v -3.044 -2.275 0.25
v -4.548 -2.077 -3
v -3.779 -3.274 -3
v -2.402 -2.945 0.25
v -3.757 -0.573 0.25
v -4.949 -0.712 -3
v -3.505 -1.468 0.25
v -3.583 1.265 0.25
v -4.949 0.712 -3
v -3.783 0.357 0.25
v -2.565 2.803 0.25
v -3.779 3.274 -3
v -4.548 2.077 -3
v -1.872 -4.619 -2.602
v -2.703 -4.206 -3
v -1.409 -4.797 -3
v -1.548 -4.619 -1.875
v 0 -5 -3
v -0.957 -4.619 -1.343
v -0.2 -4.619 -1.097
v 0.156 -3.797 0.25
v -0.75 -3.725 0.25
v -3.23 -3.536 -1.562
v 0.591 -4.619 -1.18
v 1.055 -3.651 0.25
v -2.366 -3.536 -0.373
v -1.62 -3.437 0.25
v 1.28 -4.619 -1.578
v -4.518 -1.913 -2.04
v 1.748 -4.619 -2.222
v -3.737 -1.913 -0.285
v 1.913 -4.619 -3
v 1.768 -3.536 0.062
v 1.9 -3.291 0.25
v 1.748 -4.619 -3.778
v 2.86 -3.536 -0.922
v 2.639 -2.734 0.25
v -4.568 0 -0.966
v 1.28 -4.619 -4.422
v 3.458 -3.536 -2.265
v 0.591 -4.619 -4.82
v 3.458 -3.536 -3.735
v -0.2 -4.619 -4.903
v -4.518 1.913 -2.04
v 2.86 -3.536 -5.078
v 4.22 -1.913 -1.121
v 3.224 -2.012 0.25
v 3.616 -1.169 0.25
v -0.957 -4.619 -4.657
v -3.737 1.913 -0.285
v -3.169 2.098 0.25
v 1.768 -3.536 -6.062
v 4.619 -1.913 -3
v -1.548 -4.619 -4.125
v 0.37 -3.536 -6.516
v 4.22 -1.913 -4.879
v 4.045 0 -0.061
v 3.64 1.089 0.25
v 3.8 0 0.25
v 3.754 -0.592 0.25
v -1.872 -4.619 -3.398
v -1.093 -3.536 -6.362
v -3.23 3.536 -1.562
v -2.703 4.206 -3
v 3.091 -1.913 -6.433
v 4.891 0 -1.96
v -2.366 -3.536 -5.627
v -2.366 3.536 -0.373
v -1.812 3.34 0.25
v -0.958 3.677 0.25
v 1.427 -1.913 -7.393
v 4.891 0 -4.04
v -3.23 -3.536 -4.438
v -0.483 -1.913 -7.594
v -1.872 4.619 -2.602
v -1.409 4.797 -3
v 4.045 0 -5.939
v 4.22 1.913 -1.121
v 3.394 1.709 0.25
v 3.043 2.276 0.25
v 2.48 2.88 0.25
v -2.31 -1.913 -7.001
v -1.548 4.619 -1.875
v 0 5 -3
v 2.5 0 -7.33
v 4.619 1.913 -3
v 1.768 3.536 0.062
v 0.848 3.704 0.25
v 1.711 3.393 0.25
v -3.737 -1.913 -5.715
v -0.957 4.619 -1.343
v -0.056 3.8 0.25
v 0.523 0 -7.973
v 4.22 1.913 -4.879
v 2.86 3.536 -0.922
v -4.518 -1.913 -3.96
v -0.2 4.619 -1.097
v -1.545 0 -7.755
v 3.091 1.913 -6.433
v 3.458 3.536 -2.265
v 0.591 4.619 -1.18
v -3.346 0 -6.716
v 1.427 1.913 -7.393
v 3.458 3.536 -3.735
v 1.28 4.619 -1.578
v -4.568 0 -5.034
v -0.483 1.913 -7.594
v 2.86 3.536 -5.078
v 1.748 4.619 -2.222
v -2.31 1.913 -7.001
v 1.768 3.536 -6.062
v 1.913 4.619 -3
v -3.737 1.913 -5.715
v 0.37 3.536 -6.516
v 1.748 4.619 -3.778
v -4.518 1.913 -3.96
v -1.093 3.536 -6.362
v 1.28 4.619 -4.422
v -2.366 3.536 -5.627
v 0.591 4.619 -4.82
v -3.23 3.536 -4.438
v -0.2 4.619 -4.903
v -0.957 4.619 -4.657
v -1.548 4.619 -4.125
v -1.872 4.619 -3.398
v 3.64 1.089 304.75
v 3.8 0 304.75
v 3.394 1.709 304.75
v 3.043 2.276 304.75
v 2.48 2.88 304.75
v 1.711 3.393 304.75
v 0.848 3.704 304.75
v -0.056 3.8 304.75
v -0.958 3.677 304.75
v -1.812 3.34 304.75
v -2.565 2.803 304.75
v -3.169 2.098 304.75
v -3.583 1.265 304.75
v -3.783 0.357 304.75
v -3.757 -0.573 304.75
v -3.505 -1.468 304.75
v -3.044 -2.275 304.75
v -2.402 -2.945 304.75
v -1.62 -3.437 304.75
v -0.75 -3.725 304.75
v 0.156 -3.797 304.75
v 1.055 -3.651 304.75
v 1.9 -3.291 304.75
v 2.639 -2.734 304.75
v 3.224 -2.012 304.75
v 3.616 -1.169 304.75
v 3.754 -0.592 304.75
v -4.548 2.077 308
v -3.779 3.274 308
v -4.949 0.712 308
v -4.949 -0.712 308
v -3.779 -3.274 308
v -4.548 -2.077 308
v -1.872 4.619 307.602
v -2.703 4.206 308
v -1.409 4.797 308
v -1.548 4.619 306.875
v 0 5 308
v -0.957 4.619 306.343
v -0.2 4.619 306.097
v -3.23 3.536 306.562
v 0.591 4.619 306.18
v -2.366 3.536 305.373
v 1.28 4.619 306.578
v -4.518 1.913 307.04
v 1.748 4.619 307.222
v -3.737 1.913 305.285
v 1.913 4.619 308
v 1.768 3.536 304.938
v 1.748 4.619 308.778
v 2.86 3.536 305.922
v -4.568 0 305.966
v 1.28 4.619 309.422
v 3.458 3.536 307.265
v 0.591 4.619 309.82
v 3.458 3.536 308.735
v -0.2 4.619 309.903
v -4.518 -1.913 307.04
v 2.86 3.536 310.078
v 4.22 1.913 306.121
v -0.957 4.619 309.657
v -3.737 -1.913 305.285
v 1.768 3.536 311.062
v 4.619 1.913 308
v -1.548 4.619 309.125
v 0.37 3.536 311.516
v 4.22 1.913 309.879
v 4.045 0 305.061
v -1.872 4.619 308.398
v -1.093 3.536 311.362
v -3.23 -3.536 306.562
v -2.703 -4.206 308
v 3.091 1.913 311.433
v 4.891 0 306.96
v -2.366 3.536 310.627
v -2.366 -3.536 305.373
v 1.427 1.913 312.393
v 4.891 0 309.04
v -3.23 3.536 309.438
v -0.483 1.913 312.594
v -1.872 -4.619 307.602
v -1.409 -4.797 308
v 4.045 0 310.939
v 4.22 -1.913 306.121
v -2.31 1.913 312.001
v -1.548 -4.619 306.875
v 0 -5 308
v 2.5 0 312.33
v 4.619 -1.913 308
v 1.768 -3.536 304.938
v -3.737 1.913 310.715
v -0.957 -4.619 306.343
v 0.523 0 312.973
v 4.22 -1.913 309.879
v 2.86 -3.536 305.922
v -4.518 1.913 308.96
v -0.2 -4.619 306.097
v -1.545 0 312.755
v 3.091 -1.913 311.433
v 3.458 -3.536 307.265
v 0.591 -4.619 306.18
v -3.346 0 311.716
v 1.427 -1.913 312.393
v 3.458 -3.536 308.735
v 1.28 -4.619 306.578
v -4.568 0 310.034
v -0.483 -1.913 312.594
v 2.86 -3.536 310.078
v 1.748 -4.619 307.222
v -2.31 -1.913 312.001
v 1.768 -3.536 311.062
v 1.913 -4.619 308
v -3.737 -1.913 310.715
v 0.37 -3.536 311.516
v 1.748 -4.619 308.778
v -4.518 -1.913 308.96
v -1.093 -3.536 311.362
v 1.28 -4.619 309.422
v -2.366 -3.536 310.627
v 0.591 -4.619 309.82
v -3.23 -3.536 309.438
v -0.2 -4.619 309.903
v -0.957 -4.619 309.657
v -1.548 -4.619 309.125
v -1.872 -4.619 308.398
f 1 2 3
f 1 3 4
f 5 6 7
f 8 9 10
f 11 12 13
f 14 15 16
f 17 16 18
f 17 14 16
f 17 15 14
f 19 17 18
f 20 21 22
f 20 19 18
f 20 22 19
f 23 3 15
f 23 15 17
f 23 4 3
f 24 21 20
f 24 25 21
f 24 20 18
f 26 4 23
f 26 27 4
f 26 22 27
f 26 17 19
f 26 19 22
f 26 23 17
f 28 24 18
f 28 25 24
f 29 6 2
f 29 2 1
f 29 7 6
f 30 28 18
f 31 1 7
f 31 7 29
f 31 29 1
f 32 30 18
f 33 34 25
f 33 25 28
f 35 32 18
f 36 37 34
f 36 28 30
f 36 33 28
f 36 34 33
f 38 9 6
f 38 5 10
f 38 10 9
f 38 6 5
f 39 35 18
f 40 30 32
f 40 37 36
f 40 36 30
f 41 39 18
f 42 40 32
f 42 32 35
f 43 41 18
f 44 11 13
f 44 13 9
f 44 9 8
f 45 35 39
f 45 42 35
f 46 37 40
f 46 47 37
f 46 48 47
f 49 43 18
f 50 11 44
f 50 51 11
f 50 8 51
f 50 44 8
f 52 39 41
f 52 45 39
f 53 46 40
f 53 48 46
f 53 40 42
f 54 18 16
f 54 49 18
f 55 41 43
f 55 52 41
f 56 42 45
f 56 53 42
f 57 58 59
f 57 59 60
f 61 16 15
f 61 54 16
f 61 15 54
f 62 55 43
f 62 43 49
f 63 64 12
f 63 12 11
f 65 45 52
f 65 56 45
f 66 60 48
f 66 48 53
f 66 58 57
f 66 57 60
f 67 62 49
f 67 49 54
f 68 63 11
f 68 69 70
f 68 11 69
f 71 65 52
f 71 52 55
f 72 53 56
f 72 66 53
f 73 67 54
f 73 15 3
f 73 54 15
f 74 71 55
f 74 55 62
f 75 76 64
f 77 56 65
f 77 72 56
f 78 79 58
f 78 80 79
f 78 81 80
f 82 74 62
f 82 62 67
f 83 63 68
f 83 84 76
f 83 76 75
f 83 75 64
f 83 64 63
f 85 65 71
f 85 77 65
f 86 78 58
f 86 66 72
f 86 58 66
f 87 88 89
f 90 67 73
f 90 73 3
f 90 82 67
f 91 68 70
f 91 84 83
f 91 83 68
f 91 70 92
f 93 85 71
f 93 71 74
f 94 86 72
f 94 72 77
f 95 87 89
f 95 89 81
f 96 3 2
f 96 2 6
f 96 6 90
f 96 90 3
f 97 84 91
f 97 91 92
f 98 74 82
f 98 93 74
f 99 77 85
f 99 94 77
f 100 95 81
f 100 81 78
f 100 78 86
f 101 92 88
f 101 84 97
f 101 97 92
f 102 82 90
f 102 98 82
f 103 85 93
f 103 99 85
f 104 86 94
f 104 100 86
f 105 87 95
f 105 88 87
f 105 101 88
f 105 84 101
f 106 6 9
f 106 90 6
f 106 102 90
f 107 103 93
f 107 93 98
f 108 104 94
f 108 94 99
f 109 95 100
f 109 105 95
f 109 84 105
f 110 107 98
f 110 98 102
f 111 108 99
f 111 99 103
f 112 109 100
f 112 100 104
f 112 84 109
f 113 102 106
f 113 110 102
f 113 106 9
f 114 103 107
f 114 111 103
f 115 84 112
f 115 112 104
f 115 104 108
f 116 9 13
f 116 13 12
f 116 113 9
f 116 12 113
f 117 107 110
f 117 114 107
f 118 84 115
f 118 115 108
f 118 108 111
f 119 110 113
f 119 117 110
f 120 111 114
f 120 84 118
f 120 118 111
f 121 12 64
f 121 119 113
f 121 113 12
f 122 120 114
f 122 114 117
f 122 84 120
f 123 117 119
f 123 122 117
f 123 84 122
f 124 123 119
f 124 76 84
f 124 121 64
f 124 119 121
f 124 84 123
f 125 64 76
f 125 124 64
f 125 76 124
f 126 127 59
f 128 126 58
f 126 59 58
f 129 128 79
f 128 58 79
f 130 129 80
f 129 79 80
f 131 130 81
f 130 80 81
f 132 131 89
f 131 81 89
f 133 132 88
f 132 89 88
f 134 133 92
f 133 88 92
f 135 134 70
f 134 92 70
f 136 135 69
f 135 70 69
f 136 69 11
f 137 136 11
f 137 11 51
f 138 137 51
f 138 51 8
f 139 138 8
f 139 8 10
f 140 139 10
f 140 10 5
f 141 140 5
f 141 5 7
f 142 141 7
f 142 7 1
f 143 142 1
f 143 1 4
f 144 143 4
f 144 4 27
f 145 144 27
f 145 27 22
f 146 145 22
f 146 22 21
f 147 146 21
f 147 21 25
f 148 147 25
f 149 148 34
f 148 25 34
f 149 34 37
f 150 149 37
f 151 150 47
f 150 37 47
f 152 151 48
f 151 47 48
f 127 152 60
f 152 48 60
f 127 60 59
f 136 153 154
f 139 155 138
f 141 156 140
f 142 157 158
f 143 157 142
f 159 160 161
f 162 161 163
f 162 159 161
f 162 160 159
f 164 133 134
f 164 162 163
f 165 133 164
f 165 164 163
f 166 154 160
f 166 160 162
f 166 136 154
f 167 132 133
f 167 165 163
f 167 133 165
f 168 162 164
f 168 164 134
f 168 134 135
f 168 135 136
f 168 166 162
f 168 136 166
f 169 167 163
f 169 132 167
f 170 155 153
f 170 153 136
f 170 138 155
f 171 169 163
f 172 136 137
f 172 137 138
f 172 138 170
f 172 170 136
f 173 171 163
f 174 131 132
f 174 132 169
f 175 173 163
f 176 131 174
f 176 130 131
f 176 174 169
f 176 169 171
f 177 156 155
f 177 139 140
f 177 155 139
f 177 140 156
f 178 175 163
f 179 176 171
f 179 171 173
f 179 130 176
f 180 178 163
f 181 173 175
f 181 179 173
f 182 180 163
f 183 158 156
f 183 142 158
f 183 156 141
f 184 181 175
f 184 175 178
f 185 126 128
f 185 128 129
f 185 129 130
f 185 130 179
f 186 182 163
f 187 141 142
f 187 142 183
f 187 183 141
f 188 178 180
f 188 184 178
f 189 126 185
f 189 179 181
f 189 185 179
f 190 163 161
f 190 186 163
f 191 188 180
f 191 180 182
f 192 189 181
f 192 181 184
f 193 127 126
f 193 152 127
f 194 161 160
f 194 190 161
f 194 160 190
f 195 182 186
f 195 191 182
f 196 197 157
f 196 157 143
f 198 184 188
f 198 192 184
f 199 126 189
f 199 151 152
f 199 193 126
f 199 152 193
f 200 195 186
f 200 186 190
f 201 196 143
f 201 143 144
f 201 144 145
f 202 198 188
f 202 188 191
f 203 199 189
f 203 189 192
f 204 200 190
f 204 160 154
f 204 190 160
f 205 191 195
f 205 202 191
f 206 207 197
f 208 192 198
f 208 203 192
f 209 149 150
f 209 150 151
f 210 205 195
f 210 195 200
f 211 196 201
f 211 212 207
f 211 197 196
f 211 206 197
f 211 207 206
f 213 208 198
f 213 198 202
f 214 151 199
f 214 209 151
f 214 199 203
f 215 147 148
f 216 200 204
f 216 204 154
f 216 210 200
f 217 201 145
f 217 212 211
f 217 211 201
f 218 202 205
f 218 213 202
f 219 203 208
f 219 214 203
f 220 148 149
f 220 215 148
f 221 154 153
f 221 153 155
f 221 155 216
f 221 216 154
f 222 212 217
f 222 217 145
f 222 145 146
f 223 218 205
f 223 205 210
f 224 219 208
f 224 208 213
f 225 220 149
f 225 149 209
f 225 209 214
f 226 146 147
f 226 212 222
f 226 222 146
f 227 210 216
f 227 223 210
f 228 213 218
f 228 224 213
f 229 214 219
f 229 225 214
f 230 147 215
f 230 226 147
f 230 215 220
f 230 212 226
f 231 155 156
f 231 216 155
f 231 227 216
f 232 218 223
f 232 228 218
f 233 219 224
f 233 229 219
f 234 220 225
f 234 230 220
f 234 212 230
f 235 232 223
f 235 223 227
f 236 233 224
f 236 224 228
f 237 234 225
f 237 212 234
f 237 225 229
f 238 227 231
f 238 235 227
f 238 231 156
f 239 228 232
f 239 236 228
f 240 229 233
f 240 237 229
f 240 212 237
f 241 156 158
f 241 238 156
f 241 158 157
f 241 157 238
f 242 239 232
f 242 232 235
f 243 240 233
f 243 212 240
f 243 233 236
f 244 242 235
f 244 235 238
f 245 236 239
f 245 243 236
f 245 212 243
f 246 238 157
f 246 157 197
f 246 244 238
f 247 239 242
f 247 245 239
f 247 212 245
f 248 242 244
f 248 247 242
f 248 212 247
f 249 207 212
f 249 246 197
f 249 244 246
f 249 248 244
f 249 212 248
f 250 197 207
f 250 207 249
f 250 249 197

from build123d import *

# Parameters (mm, degrees)
F0_R     = 3.8
F1_DEPTH = 305


with BuildPart() as f1:
    # F0 (on Top) → F1 (new body)
    with BuildSketch(Plane.XY):
        Circle(F0_R)
    extrude(amount=F1_DEPTH)

    # F3 (on offset) → F4 (revolve)
    with BuildSketch(Plane.XY.offset(308)):
        with BuildLine():
            Line((0, -5), (0, 5))
            ThreePointArc((0, 5), (-5, 0), (0, -5))
        make_face()
    revolve(axis=Axis((0, 0, 308), (0, -1, 0)))

    # F6 (on offset) → F7 (revolve)
    with BuildSketch(Plane(origin=(0, 0, -3), x_dir=(1, 0, 0), z_dir=(0, 0, -1))):
        with BuildLine():
            Line((0, -5), (0, 5))
            ThreePointArc((0, 5), (-5, 0), (0, -5))
        make_face()
    revolve(axis=Axis((0, 0, -3), (0, 1, 0)))


solid = f1.part
